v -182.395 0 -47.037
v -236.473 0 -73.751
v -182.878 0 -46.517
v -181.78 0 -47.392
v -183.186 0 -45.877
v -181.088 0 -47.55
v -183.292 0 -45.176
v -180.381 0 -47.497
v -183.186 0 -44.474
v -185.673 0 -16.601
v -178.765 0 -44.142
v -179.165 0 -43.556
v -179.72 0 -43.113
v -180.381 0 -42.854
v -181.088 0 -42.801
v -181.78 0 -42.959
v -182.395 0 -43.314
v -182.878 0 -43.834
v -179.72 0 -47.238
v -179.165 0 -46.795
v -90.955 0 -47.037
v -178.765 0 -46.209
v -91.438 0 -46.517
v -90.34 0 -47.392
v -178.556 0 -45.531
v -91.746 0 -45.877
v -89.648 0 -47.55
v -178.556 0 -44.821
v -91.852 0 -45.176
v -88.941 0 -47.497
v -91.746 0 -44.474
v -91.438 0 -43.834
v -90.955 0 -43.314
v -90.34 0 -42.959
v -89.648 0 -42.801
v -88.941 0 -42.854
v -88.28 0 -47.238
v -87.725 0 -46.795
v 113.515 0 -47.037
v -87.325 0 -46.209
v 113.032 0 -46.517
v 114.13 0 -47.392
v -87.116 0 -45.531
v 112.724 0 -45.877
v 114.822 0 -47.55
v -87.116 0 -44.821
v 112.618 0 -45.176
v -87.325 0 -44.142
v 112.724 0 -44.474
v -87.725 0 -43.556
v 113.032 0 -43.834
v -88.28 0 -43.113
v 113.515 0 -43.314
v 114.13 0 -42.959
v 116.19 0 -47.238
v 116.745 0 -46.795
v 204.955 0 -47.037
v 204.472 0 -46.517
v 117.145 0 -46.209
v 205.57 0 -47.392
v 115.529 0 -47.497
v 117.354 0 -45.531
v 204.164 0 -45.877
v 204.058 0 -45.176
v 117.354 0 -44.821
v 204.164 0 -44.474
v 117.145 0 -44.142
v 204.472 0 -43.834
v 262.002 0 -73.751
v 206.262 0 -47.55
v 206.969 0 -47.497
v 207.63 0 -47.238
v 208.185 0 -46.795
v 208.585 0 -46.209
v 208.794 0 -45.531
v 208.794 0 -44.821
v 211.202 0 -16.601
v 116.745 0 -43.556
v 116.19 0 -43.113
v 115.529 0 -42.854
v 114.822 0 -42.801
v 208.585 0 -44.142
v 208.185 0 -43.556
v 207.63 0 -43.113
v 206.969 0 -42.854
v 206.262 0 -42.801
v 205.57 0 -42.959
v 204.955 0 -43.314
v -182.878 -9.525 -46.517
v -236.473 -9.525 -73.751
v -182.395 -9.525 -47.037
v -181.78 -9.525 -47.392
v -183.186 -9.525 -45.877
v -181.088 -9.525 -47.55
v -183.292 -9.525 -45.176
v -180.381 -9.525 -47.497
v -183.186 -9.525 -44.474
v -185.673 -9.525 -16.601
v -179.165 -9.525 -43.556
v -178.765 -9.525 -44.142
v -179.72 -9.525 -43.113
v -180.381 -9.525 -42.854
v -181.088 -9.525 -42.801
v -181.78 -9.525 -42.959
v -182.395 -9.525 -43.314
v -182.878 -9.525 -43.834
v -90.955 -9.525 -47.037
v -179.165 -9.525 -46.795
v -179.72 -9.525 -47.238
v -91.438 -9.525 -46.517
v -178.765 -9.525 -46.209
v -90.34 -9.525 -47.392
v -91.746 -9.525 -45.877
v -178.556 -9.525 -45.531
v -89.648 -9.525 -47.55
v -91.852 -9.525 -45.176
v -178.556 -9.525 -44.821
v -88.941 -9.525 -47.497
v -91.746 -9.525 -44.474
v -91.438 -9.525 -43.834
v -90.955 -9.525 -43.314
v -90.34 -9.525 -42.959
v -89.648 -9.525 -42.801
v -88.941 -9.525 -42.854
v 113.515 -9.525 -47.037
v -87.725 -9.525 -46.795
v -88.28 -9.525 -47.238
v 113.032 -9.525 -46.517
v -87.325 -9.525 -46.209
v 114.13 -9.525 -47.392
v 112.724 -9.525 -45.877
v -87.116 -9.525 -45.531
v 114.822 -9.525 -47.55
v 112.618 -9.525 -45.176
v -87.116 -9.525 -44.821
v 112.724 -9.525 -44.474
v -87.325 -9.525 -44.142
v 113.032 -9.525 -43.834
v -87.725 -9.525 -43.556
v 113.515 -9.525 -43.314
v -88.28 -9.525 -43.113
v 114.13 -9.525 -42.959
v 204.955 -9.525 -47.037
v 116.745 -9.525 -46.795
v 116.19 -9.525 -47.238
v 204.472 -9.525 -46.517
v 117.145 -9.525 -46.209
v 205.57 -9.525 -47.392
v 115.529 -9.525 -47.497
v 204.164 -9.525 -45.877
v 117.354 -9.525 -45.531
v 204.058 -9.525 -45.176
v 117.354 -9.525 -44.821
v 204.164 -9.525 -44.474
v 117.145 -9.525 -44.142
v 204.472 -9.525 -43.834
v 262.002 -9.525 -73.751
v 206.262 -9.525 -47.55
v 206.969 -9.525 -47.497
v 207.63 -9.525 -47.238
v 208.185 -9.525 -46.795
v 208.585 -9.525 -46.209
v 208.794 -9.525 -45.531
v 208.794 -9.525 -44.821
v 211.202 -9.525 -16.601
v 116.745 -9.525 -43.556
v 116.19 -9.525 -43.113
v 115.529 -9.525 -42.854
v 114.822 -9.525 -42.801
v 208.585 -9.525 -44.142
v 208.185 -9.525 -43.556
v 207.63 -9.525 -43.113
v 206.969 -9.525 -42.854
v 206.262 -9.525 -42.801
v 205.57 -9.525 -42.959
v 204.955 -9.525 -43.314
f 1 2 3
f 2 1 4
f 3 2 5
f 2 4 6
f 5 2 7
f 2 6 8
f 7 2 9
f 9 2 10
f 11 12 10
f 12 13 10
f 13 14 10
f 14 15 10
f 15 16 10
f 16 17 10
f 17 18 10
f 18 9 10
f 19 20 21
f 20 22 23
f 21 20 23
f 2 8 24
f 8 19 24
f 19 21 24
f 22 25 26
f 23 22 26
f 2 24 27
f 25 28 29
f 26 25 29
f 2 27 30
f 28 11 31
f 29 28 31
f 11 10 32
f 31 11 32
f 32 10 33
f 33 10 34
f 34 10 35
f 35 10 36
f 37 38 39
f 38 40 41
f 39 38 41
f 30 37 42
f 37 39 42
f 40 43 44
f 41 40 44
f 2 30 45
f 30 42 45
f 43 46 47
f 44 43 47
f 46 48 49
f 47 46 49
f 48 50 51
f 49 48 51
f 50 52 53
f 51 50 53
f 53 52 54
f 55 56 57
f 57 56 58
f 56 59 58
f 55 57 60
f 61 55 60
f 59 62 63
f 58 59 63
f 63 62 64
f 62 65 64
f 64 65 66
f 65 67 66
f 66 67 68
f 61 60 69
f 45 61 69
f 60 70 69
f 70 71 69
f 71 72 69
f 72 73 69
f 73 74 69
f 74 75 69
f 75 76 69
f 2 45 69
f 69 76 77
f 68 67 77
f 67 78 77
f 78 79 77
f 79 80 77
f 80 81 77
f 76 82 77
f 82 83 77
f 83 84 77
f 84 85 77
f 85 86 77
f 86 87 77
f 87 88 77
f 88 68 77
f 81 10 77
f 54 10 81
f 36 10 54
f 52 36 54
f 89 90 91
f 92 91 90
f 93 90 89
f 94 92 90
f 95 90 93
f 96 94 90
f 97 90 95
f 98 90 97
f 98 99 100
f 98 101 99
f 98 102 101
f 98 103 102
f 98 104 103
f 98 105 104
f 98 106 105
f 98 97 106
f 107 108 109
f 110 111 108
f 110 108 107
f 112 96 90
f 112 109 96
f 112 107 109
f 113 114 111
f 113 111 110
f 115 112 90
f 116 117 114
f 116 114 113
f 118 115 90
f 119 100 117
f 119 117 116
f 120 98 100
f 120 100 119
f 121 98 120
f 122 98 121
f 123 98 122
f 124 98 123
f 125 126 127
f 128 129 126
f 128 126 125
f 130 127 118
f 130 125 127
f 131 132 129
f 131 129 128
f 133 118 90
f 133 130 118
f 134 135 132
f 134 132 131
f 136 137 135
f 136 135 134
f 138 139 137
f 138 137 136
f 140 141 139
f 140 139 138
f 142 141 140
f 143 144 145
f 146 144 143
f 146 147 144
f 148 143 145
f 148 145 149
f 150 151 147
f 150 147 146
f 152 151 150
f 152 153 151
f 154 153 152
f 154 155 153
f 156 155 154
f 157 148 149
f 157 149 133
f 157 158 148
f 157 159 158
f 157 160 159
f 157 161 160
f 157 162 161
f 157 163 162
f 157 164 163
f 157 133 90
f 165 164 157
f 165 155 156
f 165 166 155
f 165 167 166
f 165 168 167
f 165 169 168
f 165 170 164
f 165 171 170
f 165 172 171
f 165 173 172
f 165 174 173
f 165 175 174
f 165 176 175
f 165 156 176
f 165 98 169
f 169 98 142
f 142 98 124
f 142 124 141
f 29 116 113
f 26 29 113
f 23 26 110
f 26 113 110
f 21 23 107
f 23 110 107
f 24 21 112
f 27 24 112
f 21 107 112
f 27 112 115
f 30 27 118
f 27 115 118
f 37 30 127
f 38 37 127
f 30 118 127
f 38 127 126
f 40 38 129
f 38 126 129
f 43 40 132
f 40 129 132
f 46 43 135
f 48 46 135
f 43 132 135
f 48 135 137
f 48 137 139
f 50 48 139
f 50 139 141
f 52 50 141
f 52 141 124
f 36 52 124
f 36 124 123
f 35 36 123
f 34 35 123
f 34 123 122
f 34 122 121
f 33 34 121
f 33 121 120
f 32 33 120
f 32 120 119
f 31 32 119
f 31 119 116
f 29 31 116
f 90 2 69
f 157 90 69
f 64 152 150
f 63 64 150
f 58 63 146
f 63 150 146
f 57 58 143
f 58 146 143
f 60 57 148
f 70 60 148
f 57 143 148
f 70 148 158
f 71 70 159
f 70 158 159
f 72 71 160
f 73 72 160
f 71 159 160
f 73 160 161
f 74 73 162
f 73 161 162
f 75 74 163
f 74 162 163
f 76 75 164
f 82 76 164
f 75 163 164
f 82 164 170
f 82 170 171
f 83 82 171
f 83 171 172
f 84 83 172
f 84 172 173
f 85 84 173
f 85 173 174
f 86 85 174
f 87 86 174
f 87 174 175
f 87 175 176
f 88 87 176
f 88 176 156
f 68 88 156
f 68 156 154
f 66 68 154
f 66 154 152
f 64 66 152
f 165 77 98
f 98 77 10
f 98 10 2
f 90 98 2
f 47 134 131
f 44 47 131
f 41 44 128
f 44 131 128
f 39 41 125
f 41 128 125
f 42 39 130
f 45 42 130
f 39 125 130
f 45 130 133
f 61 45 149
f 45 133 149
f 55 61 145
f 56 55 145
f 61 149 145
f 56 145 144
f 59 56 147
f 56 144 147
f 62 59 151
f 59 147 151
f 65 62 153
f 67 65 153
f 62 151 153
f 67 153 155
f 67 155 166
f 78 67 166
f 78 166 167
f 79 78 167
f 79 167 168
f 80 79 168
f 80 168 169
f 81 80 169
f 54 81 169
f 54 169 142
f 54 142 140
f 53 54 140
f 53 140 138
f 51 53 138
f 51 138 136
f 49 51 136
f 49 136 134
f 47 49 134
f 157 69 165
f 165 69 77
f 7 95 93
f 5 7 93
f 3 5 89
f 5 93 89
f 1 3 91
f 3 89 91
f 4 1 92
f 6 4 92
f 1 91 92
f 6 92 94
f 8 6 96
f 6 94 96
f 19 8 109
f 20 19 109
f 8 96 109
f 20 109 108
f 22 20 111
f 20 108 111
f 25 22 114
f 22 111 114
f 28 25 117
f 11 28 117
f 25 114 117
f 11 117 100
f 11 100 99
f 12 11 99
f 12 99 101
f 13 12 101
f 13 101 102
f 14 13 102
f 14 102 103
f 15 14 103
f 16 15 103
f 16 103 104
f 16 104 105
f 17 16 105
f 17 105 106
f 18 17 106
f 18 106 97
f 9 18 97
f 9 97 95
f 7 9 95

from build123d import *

# Parameters (mm, degrees)
F1_DEPTH = 9.525
F2_DEPTH = 9.525
F3_D     = 4.7625
F4_D     = 4.7625
F5_D     = 4.7625
F6_D     = 4.7625


with BuildPart() as f1:
    # F0 (on Front) → F1 (new body)
    with BuildSketch(Plane.XZ):
        Polygon((211.2021158695, -16.6006076694), (-185.6728841305, -16.6006076694), (-236.4728841305, -73.7506076694), (-185.6728841305, -73.7506076694), (-93.5978841305, -73.7506076694), (119.1271158695, -73.7506076694), (211.2021158695, -73.7506076694), (262.0021158695, -73.7506076694), align=None)
    extrude(amount=F1_DEPTH)

    # F0 (on Front) → F2 (join)
    with BuildSketch(Plane.XZ):
        Polygon((211.2021158695, -16.6006076694), (-185.6728841305, -16.6006076694), (-236.4728841305, -73.7506076694), (-185.6728841305, -73.7506076694), (-93.5978841305, -73.7506076694), (119.1271158695, -73.7506076694), (211.2021158695, -73.7506076694), (262.0021158695, -73.7506076694), align=None)
    extrude(amount=F2_DEPTH)

    # F3 (through all)
    with Locations(Plane(origin=(0, 0, 0), x_dir=(1, 0, 0), z_dir=(0, 1, 0))):
        with Locations((114.9996158695, 45.1756076694)):
            Hole(F3_D / 2)

    # F4 (through all)
    with Locations(Plane(origin=(0, 0, 0), x_dir=(1, 0, 0), z_dir=(0, 1, 0))):
        with Locations((-89.4703841305, 45.1756076694)):
            Hole(F4_D / 2)

    # F5 (through all)
    with Locations(Plane(origin=(0, 0, 0), x_dir=(1, 0, 0), z_dir=(0, 1, 0))):
        with Locations((206.4396158695, 45.1756076694)):
            Hole(F5_D / 2)

    # F6 (through all)
    with Locations(Plane(origin=(0, 0, 0), x_dir=(1, 0, 0), z_dir=(0, 1, 0))):
        with Locations((-180.9103841305, 45.1756076694)):
            Hole(F6_D / 2)


solid = f1.part
